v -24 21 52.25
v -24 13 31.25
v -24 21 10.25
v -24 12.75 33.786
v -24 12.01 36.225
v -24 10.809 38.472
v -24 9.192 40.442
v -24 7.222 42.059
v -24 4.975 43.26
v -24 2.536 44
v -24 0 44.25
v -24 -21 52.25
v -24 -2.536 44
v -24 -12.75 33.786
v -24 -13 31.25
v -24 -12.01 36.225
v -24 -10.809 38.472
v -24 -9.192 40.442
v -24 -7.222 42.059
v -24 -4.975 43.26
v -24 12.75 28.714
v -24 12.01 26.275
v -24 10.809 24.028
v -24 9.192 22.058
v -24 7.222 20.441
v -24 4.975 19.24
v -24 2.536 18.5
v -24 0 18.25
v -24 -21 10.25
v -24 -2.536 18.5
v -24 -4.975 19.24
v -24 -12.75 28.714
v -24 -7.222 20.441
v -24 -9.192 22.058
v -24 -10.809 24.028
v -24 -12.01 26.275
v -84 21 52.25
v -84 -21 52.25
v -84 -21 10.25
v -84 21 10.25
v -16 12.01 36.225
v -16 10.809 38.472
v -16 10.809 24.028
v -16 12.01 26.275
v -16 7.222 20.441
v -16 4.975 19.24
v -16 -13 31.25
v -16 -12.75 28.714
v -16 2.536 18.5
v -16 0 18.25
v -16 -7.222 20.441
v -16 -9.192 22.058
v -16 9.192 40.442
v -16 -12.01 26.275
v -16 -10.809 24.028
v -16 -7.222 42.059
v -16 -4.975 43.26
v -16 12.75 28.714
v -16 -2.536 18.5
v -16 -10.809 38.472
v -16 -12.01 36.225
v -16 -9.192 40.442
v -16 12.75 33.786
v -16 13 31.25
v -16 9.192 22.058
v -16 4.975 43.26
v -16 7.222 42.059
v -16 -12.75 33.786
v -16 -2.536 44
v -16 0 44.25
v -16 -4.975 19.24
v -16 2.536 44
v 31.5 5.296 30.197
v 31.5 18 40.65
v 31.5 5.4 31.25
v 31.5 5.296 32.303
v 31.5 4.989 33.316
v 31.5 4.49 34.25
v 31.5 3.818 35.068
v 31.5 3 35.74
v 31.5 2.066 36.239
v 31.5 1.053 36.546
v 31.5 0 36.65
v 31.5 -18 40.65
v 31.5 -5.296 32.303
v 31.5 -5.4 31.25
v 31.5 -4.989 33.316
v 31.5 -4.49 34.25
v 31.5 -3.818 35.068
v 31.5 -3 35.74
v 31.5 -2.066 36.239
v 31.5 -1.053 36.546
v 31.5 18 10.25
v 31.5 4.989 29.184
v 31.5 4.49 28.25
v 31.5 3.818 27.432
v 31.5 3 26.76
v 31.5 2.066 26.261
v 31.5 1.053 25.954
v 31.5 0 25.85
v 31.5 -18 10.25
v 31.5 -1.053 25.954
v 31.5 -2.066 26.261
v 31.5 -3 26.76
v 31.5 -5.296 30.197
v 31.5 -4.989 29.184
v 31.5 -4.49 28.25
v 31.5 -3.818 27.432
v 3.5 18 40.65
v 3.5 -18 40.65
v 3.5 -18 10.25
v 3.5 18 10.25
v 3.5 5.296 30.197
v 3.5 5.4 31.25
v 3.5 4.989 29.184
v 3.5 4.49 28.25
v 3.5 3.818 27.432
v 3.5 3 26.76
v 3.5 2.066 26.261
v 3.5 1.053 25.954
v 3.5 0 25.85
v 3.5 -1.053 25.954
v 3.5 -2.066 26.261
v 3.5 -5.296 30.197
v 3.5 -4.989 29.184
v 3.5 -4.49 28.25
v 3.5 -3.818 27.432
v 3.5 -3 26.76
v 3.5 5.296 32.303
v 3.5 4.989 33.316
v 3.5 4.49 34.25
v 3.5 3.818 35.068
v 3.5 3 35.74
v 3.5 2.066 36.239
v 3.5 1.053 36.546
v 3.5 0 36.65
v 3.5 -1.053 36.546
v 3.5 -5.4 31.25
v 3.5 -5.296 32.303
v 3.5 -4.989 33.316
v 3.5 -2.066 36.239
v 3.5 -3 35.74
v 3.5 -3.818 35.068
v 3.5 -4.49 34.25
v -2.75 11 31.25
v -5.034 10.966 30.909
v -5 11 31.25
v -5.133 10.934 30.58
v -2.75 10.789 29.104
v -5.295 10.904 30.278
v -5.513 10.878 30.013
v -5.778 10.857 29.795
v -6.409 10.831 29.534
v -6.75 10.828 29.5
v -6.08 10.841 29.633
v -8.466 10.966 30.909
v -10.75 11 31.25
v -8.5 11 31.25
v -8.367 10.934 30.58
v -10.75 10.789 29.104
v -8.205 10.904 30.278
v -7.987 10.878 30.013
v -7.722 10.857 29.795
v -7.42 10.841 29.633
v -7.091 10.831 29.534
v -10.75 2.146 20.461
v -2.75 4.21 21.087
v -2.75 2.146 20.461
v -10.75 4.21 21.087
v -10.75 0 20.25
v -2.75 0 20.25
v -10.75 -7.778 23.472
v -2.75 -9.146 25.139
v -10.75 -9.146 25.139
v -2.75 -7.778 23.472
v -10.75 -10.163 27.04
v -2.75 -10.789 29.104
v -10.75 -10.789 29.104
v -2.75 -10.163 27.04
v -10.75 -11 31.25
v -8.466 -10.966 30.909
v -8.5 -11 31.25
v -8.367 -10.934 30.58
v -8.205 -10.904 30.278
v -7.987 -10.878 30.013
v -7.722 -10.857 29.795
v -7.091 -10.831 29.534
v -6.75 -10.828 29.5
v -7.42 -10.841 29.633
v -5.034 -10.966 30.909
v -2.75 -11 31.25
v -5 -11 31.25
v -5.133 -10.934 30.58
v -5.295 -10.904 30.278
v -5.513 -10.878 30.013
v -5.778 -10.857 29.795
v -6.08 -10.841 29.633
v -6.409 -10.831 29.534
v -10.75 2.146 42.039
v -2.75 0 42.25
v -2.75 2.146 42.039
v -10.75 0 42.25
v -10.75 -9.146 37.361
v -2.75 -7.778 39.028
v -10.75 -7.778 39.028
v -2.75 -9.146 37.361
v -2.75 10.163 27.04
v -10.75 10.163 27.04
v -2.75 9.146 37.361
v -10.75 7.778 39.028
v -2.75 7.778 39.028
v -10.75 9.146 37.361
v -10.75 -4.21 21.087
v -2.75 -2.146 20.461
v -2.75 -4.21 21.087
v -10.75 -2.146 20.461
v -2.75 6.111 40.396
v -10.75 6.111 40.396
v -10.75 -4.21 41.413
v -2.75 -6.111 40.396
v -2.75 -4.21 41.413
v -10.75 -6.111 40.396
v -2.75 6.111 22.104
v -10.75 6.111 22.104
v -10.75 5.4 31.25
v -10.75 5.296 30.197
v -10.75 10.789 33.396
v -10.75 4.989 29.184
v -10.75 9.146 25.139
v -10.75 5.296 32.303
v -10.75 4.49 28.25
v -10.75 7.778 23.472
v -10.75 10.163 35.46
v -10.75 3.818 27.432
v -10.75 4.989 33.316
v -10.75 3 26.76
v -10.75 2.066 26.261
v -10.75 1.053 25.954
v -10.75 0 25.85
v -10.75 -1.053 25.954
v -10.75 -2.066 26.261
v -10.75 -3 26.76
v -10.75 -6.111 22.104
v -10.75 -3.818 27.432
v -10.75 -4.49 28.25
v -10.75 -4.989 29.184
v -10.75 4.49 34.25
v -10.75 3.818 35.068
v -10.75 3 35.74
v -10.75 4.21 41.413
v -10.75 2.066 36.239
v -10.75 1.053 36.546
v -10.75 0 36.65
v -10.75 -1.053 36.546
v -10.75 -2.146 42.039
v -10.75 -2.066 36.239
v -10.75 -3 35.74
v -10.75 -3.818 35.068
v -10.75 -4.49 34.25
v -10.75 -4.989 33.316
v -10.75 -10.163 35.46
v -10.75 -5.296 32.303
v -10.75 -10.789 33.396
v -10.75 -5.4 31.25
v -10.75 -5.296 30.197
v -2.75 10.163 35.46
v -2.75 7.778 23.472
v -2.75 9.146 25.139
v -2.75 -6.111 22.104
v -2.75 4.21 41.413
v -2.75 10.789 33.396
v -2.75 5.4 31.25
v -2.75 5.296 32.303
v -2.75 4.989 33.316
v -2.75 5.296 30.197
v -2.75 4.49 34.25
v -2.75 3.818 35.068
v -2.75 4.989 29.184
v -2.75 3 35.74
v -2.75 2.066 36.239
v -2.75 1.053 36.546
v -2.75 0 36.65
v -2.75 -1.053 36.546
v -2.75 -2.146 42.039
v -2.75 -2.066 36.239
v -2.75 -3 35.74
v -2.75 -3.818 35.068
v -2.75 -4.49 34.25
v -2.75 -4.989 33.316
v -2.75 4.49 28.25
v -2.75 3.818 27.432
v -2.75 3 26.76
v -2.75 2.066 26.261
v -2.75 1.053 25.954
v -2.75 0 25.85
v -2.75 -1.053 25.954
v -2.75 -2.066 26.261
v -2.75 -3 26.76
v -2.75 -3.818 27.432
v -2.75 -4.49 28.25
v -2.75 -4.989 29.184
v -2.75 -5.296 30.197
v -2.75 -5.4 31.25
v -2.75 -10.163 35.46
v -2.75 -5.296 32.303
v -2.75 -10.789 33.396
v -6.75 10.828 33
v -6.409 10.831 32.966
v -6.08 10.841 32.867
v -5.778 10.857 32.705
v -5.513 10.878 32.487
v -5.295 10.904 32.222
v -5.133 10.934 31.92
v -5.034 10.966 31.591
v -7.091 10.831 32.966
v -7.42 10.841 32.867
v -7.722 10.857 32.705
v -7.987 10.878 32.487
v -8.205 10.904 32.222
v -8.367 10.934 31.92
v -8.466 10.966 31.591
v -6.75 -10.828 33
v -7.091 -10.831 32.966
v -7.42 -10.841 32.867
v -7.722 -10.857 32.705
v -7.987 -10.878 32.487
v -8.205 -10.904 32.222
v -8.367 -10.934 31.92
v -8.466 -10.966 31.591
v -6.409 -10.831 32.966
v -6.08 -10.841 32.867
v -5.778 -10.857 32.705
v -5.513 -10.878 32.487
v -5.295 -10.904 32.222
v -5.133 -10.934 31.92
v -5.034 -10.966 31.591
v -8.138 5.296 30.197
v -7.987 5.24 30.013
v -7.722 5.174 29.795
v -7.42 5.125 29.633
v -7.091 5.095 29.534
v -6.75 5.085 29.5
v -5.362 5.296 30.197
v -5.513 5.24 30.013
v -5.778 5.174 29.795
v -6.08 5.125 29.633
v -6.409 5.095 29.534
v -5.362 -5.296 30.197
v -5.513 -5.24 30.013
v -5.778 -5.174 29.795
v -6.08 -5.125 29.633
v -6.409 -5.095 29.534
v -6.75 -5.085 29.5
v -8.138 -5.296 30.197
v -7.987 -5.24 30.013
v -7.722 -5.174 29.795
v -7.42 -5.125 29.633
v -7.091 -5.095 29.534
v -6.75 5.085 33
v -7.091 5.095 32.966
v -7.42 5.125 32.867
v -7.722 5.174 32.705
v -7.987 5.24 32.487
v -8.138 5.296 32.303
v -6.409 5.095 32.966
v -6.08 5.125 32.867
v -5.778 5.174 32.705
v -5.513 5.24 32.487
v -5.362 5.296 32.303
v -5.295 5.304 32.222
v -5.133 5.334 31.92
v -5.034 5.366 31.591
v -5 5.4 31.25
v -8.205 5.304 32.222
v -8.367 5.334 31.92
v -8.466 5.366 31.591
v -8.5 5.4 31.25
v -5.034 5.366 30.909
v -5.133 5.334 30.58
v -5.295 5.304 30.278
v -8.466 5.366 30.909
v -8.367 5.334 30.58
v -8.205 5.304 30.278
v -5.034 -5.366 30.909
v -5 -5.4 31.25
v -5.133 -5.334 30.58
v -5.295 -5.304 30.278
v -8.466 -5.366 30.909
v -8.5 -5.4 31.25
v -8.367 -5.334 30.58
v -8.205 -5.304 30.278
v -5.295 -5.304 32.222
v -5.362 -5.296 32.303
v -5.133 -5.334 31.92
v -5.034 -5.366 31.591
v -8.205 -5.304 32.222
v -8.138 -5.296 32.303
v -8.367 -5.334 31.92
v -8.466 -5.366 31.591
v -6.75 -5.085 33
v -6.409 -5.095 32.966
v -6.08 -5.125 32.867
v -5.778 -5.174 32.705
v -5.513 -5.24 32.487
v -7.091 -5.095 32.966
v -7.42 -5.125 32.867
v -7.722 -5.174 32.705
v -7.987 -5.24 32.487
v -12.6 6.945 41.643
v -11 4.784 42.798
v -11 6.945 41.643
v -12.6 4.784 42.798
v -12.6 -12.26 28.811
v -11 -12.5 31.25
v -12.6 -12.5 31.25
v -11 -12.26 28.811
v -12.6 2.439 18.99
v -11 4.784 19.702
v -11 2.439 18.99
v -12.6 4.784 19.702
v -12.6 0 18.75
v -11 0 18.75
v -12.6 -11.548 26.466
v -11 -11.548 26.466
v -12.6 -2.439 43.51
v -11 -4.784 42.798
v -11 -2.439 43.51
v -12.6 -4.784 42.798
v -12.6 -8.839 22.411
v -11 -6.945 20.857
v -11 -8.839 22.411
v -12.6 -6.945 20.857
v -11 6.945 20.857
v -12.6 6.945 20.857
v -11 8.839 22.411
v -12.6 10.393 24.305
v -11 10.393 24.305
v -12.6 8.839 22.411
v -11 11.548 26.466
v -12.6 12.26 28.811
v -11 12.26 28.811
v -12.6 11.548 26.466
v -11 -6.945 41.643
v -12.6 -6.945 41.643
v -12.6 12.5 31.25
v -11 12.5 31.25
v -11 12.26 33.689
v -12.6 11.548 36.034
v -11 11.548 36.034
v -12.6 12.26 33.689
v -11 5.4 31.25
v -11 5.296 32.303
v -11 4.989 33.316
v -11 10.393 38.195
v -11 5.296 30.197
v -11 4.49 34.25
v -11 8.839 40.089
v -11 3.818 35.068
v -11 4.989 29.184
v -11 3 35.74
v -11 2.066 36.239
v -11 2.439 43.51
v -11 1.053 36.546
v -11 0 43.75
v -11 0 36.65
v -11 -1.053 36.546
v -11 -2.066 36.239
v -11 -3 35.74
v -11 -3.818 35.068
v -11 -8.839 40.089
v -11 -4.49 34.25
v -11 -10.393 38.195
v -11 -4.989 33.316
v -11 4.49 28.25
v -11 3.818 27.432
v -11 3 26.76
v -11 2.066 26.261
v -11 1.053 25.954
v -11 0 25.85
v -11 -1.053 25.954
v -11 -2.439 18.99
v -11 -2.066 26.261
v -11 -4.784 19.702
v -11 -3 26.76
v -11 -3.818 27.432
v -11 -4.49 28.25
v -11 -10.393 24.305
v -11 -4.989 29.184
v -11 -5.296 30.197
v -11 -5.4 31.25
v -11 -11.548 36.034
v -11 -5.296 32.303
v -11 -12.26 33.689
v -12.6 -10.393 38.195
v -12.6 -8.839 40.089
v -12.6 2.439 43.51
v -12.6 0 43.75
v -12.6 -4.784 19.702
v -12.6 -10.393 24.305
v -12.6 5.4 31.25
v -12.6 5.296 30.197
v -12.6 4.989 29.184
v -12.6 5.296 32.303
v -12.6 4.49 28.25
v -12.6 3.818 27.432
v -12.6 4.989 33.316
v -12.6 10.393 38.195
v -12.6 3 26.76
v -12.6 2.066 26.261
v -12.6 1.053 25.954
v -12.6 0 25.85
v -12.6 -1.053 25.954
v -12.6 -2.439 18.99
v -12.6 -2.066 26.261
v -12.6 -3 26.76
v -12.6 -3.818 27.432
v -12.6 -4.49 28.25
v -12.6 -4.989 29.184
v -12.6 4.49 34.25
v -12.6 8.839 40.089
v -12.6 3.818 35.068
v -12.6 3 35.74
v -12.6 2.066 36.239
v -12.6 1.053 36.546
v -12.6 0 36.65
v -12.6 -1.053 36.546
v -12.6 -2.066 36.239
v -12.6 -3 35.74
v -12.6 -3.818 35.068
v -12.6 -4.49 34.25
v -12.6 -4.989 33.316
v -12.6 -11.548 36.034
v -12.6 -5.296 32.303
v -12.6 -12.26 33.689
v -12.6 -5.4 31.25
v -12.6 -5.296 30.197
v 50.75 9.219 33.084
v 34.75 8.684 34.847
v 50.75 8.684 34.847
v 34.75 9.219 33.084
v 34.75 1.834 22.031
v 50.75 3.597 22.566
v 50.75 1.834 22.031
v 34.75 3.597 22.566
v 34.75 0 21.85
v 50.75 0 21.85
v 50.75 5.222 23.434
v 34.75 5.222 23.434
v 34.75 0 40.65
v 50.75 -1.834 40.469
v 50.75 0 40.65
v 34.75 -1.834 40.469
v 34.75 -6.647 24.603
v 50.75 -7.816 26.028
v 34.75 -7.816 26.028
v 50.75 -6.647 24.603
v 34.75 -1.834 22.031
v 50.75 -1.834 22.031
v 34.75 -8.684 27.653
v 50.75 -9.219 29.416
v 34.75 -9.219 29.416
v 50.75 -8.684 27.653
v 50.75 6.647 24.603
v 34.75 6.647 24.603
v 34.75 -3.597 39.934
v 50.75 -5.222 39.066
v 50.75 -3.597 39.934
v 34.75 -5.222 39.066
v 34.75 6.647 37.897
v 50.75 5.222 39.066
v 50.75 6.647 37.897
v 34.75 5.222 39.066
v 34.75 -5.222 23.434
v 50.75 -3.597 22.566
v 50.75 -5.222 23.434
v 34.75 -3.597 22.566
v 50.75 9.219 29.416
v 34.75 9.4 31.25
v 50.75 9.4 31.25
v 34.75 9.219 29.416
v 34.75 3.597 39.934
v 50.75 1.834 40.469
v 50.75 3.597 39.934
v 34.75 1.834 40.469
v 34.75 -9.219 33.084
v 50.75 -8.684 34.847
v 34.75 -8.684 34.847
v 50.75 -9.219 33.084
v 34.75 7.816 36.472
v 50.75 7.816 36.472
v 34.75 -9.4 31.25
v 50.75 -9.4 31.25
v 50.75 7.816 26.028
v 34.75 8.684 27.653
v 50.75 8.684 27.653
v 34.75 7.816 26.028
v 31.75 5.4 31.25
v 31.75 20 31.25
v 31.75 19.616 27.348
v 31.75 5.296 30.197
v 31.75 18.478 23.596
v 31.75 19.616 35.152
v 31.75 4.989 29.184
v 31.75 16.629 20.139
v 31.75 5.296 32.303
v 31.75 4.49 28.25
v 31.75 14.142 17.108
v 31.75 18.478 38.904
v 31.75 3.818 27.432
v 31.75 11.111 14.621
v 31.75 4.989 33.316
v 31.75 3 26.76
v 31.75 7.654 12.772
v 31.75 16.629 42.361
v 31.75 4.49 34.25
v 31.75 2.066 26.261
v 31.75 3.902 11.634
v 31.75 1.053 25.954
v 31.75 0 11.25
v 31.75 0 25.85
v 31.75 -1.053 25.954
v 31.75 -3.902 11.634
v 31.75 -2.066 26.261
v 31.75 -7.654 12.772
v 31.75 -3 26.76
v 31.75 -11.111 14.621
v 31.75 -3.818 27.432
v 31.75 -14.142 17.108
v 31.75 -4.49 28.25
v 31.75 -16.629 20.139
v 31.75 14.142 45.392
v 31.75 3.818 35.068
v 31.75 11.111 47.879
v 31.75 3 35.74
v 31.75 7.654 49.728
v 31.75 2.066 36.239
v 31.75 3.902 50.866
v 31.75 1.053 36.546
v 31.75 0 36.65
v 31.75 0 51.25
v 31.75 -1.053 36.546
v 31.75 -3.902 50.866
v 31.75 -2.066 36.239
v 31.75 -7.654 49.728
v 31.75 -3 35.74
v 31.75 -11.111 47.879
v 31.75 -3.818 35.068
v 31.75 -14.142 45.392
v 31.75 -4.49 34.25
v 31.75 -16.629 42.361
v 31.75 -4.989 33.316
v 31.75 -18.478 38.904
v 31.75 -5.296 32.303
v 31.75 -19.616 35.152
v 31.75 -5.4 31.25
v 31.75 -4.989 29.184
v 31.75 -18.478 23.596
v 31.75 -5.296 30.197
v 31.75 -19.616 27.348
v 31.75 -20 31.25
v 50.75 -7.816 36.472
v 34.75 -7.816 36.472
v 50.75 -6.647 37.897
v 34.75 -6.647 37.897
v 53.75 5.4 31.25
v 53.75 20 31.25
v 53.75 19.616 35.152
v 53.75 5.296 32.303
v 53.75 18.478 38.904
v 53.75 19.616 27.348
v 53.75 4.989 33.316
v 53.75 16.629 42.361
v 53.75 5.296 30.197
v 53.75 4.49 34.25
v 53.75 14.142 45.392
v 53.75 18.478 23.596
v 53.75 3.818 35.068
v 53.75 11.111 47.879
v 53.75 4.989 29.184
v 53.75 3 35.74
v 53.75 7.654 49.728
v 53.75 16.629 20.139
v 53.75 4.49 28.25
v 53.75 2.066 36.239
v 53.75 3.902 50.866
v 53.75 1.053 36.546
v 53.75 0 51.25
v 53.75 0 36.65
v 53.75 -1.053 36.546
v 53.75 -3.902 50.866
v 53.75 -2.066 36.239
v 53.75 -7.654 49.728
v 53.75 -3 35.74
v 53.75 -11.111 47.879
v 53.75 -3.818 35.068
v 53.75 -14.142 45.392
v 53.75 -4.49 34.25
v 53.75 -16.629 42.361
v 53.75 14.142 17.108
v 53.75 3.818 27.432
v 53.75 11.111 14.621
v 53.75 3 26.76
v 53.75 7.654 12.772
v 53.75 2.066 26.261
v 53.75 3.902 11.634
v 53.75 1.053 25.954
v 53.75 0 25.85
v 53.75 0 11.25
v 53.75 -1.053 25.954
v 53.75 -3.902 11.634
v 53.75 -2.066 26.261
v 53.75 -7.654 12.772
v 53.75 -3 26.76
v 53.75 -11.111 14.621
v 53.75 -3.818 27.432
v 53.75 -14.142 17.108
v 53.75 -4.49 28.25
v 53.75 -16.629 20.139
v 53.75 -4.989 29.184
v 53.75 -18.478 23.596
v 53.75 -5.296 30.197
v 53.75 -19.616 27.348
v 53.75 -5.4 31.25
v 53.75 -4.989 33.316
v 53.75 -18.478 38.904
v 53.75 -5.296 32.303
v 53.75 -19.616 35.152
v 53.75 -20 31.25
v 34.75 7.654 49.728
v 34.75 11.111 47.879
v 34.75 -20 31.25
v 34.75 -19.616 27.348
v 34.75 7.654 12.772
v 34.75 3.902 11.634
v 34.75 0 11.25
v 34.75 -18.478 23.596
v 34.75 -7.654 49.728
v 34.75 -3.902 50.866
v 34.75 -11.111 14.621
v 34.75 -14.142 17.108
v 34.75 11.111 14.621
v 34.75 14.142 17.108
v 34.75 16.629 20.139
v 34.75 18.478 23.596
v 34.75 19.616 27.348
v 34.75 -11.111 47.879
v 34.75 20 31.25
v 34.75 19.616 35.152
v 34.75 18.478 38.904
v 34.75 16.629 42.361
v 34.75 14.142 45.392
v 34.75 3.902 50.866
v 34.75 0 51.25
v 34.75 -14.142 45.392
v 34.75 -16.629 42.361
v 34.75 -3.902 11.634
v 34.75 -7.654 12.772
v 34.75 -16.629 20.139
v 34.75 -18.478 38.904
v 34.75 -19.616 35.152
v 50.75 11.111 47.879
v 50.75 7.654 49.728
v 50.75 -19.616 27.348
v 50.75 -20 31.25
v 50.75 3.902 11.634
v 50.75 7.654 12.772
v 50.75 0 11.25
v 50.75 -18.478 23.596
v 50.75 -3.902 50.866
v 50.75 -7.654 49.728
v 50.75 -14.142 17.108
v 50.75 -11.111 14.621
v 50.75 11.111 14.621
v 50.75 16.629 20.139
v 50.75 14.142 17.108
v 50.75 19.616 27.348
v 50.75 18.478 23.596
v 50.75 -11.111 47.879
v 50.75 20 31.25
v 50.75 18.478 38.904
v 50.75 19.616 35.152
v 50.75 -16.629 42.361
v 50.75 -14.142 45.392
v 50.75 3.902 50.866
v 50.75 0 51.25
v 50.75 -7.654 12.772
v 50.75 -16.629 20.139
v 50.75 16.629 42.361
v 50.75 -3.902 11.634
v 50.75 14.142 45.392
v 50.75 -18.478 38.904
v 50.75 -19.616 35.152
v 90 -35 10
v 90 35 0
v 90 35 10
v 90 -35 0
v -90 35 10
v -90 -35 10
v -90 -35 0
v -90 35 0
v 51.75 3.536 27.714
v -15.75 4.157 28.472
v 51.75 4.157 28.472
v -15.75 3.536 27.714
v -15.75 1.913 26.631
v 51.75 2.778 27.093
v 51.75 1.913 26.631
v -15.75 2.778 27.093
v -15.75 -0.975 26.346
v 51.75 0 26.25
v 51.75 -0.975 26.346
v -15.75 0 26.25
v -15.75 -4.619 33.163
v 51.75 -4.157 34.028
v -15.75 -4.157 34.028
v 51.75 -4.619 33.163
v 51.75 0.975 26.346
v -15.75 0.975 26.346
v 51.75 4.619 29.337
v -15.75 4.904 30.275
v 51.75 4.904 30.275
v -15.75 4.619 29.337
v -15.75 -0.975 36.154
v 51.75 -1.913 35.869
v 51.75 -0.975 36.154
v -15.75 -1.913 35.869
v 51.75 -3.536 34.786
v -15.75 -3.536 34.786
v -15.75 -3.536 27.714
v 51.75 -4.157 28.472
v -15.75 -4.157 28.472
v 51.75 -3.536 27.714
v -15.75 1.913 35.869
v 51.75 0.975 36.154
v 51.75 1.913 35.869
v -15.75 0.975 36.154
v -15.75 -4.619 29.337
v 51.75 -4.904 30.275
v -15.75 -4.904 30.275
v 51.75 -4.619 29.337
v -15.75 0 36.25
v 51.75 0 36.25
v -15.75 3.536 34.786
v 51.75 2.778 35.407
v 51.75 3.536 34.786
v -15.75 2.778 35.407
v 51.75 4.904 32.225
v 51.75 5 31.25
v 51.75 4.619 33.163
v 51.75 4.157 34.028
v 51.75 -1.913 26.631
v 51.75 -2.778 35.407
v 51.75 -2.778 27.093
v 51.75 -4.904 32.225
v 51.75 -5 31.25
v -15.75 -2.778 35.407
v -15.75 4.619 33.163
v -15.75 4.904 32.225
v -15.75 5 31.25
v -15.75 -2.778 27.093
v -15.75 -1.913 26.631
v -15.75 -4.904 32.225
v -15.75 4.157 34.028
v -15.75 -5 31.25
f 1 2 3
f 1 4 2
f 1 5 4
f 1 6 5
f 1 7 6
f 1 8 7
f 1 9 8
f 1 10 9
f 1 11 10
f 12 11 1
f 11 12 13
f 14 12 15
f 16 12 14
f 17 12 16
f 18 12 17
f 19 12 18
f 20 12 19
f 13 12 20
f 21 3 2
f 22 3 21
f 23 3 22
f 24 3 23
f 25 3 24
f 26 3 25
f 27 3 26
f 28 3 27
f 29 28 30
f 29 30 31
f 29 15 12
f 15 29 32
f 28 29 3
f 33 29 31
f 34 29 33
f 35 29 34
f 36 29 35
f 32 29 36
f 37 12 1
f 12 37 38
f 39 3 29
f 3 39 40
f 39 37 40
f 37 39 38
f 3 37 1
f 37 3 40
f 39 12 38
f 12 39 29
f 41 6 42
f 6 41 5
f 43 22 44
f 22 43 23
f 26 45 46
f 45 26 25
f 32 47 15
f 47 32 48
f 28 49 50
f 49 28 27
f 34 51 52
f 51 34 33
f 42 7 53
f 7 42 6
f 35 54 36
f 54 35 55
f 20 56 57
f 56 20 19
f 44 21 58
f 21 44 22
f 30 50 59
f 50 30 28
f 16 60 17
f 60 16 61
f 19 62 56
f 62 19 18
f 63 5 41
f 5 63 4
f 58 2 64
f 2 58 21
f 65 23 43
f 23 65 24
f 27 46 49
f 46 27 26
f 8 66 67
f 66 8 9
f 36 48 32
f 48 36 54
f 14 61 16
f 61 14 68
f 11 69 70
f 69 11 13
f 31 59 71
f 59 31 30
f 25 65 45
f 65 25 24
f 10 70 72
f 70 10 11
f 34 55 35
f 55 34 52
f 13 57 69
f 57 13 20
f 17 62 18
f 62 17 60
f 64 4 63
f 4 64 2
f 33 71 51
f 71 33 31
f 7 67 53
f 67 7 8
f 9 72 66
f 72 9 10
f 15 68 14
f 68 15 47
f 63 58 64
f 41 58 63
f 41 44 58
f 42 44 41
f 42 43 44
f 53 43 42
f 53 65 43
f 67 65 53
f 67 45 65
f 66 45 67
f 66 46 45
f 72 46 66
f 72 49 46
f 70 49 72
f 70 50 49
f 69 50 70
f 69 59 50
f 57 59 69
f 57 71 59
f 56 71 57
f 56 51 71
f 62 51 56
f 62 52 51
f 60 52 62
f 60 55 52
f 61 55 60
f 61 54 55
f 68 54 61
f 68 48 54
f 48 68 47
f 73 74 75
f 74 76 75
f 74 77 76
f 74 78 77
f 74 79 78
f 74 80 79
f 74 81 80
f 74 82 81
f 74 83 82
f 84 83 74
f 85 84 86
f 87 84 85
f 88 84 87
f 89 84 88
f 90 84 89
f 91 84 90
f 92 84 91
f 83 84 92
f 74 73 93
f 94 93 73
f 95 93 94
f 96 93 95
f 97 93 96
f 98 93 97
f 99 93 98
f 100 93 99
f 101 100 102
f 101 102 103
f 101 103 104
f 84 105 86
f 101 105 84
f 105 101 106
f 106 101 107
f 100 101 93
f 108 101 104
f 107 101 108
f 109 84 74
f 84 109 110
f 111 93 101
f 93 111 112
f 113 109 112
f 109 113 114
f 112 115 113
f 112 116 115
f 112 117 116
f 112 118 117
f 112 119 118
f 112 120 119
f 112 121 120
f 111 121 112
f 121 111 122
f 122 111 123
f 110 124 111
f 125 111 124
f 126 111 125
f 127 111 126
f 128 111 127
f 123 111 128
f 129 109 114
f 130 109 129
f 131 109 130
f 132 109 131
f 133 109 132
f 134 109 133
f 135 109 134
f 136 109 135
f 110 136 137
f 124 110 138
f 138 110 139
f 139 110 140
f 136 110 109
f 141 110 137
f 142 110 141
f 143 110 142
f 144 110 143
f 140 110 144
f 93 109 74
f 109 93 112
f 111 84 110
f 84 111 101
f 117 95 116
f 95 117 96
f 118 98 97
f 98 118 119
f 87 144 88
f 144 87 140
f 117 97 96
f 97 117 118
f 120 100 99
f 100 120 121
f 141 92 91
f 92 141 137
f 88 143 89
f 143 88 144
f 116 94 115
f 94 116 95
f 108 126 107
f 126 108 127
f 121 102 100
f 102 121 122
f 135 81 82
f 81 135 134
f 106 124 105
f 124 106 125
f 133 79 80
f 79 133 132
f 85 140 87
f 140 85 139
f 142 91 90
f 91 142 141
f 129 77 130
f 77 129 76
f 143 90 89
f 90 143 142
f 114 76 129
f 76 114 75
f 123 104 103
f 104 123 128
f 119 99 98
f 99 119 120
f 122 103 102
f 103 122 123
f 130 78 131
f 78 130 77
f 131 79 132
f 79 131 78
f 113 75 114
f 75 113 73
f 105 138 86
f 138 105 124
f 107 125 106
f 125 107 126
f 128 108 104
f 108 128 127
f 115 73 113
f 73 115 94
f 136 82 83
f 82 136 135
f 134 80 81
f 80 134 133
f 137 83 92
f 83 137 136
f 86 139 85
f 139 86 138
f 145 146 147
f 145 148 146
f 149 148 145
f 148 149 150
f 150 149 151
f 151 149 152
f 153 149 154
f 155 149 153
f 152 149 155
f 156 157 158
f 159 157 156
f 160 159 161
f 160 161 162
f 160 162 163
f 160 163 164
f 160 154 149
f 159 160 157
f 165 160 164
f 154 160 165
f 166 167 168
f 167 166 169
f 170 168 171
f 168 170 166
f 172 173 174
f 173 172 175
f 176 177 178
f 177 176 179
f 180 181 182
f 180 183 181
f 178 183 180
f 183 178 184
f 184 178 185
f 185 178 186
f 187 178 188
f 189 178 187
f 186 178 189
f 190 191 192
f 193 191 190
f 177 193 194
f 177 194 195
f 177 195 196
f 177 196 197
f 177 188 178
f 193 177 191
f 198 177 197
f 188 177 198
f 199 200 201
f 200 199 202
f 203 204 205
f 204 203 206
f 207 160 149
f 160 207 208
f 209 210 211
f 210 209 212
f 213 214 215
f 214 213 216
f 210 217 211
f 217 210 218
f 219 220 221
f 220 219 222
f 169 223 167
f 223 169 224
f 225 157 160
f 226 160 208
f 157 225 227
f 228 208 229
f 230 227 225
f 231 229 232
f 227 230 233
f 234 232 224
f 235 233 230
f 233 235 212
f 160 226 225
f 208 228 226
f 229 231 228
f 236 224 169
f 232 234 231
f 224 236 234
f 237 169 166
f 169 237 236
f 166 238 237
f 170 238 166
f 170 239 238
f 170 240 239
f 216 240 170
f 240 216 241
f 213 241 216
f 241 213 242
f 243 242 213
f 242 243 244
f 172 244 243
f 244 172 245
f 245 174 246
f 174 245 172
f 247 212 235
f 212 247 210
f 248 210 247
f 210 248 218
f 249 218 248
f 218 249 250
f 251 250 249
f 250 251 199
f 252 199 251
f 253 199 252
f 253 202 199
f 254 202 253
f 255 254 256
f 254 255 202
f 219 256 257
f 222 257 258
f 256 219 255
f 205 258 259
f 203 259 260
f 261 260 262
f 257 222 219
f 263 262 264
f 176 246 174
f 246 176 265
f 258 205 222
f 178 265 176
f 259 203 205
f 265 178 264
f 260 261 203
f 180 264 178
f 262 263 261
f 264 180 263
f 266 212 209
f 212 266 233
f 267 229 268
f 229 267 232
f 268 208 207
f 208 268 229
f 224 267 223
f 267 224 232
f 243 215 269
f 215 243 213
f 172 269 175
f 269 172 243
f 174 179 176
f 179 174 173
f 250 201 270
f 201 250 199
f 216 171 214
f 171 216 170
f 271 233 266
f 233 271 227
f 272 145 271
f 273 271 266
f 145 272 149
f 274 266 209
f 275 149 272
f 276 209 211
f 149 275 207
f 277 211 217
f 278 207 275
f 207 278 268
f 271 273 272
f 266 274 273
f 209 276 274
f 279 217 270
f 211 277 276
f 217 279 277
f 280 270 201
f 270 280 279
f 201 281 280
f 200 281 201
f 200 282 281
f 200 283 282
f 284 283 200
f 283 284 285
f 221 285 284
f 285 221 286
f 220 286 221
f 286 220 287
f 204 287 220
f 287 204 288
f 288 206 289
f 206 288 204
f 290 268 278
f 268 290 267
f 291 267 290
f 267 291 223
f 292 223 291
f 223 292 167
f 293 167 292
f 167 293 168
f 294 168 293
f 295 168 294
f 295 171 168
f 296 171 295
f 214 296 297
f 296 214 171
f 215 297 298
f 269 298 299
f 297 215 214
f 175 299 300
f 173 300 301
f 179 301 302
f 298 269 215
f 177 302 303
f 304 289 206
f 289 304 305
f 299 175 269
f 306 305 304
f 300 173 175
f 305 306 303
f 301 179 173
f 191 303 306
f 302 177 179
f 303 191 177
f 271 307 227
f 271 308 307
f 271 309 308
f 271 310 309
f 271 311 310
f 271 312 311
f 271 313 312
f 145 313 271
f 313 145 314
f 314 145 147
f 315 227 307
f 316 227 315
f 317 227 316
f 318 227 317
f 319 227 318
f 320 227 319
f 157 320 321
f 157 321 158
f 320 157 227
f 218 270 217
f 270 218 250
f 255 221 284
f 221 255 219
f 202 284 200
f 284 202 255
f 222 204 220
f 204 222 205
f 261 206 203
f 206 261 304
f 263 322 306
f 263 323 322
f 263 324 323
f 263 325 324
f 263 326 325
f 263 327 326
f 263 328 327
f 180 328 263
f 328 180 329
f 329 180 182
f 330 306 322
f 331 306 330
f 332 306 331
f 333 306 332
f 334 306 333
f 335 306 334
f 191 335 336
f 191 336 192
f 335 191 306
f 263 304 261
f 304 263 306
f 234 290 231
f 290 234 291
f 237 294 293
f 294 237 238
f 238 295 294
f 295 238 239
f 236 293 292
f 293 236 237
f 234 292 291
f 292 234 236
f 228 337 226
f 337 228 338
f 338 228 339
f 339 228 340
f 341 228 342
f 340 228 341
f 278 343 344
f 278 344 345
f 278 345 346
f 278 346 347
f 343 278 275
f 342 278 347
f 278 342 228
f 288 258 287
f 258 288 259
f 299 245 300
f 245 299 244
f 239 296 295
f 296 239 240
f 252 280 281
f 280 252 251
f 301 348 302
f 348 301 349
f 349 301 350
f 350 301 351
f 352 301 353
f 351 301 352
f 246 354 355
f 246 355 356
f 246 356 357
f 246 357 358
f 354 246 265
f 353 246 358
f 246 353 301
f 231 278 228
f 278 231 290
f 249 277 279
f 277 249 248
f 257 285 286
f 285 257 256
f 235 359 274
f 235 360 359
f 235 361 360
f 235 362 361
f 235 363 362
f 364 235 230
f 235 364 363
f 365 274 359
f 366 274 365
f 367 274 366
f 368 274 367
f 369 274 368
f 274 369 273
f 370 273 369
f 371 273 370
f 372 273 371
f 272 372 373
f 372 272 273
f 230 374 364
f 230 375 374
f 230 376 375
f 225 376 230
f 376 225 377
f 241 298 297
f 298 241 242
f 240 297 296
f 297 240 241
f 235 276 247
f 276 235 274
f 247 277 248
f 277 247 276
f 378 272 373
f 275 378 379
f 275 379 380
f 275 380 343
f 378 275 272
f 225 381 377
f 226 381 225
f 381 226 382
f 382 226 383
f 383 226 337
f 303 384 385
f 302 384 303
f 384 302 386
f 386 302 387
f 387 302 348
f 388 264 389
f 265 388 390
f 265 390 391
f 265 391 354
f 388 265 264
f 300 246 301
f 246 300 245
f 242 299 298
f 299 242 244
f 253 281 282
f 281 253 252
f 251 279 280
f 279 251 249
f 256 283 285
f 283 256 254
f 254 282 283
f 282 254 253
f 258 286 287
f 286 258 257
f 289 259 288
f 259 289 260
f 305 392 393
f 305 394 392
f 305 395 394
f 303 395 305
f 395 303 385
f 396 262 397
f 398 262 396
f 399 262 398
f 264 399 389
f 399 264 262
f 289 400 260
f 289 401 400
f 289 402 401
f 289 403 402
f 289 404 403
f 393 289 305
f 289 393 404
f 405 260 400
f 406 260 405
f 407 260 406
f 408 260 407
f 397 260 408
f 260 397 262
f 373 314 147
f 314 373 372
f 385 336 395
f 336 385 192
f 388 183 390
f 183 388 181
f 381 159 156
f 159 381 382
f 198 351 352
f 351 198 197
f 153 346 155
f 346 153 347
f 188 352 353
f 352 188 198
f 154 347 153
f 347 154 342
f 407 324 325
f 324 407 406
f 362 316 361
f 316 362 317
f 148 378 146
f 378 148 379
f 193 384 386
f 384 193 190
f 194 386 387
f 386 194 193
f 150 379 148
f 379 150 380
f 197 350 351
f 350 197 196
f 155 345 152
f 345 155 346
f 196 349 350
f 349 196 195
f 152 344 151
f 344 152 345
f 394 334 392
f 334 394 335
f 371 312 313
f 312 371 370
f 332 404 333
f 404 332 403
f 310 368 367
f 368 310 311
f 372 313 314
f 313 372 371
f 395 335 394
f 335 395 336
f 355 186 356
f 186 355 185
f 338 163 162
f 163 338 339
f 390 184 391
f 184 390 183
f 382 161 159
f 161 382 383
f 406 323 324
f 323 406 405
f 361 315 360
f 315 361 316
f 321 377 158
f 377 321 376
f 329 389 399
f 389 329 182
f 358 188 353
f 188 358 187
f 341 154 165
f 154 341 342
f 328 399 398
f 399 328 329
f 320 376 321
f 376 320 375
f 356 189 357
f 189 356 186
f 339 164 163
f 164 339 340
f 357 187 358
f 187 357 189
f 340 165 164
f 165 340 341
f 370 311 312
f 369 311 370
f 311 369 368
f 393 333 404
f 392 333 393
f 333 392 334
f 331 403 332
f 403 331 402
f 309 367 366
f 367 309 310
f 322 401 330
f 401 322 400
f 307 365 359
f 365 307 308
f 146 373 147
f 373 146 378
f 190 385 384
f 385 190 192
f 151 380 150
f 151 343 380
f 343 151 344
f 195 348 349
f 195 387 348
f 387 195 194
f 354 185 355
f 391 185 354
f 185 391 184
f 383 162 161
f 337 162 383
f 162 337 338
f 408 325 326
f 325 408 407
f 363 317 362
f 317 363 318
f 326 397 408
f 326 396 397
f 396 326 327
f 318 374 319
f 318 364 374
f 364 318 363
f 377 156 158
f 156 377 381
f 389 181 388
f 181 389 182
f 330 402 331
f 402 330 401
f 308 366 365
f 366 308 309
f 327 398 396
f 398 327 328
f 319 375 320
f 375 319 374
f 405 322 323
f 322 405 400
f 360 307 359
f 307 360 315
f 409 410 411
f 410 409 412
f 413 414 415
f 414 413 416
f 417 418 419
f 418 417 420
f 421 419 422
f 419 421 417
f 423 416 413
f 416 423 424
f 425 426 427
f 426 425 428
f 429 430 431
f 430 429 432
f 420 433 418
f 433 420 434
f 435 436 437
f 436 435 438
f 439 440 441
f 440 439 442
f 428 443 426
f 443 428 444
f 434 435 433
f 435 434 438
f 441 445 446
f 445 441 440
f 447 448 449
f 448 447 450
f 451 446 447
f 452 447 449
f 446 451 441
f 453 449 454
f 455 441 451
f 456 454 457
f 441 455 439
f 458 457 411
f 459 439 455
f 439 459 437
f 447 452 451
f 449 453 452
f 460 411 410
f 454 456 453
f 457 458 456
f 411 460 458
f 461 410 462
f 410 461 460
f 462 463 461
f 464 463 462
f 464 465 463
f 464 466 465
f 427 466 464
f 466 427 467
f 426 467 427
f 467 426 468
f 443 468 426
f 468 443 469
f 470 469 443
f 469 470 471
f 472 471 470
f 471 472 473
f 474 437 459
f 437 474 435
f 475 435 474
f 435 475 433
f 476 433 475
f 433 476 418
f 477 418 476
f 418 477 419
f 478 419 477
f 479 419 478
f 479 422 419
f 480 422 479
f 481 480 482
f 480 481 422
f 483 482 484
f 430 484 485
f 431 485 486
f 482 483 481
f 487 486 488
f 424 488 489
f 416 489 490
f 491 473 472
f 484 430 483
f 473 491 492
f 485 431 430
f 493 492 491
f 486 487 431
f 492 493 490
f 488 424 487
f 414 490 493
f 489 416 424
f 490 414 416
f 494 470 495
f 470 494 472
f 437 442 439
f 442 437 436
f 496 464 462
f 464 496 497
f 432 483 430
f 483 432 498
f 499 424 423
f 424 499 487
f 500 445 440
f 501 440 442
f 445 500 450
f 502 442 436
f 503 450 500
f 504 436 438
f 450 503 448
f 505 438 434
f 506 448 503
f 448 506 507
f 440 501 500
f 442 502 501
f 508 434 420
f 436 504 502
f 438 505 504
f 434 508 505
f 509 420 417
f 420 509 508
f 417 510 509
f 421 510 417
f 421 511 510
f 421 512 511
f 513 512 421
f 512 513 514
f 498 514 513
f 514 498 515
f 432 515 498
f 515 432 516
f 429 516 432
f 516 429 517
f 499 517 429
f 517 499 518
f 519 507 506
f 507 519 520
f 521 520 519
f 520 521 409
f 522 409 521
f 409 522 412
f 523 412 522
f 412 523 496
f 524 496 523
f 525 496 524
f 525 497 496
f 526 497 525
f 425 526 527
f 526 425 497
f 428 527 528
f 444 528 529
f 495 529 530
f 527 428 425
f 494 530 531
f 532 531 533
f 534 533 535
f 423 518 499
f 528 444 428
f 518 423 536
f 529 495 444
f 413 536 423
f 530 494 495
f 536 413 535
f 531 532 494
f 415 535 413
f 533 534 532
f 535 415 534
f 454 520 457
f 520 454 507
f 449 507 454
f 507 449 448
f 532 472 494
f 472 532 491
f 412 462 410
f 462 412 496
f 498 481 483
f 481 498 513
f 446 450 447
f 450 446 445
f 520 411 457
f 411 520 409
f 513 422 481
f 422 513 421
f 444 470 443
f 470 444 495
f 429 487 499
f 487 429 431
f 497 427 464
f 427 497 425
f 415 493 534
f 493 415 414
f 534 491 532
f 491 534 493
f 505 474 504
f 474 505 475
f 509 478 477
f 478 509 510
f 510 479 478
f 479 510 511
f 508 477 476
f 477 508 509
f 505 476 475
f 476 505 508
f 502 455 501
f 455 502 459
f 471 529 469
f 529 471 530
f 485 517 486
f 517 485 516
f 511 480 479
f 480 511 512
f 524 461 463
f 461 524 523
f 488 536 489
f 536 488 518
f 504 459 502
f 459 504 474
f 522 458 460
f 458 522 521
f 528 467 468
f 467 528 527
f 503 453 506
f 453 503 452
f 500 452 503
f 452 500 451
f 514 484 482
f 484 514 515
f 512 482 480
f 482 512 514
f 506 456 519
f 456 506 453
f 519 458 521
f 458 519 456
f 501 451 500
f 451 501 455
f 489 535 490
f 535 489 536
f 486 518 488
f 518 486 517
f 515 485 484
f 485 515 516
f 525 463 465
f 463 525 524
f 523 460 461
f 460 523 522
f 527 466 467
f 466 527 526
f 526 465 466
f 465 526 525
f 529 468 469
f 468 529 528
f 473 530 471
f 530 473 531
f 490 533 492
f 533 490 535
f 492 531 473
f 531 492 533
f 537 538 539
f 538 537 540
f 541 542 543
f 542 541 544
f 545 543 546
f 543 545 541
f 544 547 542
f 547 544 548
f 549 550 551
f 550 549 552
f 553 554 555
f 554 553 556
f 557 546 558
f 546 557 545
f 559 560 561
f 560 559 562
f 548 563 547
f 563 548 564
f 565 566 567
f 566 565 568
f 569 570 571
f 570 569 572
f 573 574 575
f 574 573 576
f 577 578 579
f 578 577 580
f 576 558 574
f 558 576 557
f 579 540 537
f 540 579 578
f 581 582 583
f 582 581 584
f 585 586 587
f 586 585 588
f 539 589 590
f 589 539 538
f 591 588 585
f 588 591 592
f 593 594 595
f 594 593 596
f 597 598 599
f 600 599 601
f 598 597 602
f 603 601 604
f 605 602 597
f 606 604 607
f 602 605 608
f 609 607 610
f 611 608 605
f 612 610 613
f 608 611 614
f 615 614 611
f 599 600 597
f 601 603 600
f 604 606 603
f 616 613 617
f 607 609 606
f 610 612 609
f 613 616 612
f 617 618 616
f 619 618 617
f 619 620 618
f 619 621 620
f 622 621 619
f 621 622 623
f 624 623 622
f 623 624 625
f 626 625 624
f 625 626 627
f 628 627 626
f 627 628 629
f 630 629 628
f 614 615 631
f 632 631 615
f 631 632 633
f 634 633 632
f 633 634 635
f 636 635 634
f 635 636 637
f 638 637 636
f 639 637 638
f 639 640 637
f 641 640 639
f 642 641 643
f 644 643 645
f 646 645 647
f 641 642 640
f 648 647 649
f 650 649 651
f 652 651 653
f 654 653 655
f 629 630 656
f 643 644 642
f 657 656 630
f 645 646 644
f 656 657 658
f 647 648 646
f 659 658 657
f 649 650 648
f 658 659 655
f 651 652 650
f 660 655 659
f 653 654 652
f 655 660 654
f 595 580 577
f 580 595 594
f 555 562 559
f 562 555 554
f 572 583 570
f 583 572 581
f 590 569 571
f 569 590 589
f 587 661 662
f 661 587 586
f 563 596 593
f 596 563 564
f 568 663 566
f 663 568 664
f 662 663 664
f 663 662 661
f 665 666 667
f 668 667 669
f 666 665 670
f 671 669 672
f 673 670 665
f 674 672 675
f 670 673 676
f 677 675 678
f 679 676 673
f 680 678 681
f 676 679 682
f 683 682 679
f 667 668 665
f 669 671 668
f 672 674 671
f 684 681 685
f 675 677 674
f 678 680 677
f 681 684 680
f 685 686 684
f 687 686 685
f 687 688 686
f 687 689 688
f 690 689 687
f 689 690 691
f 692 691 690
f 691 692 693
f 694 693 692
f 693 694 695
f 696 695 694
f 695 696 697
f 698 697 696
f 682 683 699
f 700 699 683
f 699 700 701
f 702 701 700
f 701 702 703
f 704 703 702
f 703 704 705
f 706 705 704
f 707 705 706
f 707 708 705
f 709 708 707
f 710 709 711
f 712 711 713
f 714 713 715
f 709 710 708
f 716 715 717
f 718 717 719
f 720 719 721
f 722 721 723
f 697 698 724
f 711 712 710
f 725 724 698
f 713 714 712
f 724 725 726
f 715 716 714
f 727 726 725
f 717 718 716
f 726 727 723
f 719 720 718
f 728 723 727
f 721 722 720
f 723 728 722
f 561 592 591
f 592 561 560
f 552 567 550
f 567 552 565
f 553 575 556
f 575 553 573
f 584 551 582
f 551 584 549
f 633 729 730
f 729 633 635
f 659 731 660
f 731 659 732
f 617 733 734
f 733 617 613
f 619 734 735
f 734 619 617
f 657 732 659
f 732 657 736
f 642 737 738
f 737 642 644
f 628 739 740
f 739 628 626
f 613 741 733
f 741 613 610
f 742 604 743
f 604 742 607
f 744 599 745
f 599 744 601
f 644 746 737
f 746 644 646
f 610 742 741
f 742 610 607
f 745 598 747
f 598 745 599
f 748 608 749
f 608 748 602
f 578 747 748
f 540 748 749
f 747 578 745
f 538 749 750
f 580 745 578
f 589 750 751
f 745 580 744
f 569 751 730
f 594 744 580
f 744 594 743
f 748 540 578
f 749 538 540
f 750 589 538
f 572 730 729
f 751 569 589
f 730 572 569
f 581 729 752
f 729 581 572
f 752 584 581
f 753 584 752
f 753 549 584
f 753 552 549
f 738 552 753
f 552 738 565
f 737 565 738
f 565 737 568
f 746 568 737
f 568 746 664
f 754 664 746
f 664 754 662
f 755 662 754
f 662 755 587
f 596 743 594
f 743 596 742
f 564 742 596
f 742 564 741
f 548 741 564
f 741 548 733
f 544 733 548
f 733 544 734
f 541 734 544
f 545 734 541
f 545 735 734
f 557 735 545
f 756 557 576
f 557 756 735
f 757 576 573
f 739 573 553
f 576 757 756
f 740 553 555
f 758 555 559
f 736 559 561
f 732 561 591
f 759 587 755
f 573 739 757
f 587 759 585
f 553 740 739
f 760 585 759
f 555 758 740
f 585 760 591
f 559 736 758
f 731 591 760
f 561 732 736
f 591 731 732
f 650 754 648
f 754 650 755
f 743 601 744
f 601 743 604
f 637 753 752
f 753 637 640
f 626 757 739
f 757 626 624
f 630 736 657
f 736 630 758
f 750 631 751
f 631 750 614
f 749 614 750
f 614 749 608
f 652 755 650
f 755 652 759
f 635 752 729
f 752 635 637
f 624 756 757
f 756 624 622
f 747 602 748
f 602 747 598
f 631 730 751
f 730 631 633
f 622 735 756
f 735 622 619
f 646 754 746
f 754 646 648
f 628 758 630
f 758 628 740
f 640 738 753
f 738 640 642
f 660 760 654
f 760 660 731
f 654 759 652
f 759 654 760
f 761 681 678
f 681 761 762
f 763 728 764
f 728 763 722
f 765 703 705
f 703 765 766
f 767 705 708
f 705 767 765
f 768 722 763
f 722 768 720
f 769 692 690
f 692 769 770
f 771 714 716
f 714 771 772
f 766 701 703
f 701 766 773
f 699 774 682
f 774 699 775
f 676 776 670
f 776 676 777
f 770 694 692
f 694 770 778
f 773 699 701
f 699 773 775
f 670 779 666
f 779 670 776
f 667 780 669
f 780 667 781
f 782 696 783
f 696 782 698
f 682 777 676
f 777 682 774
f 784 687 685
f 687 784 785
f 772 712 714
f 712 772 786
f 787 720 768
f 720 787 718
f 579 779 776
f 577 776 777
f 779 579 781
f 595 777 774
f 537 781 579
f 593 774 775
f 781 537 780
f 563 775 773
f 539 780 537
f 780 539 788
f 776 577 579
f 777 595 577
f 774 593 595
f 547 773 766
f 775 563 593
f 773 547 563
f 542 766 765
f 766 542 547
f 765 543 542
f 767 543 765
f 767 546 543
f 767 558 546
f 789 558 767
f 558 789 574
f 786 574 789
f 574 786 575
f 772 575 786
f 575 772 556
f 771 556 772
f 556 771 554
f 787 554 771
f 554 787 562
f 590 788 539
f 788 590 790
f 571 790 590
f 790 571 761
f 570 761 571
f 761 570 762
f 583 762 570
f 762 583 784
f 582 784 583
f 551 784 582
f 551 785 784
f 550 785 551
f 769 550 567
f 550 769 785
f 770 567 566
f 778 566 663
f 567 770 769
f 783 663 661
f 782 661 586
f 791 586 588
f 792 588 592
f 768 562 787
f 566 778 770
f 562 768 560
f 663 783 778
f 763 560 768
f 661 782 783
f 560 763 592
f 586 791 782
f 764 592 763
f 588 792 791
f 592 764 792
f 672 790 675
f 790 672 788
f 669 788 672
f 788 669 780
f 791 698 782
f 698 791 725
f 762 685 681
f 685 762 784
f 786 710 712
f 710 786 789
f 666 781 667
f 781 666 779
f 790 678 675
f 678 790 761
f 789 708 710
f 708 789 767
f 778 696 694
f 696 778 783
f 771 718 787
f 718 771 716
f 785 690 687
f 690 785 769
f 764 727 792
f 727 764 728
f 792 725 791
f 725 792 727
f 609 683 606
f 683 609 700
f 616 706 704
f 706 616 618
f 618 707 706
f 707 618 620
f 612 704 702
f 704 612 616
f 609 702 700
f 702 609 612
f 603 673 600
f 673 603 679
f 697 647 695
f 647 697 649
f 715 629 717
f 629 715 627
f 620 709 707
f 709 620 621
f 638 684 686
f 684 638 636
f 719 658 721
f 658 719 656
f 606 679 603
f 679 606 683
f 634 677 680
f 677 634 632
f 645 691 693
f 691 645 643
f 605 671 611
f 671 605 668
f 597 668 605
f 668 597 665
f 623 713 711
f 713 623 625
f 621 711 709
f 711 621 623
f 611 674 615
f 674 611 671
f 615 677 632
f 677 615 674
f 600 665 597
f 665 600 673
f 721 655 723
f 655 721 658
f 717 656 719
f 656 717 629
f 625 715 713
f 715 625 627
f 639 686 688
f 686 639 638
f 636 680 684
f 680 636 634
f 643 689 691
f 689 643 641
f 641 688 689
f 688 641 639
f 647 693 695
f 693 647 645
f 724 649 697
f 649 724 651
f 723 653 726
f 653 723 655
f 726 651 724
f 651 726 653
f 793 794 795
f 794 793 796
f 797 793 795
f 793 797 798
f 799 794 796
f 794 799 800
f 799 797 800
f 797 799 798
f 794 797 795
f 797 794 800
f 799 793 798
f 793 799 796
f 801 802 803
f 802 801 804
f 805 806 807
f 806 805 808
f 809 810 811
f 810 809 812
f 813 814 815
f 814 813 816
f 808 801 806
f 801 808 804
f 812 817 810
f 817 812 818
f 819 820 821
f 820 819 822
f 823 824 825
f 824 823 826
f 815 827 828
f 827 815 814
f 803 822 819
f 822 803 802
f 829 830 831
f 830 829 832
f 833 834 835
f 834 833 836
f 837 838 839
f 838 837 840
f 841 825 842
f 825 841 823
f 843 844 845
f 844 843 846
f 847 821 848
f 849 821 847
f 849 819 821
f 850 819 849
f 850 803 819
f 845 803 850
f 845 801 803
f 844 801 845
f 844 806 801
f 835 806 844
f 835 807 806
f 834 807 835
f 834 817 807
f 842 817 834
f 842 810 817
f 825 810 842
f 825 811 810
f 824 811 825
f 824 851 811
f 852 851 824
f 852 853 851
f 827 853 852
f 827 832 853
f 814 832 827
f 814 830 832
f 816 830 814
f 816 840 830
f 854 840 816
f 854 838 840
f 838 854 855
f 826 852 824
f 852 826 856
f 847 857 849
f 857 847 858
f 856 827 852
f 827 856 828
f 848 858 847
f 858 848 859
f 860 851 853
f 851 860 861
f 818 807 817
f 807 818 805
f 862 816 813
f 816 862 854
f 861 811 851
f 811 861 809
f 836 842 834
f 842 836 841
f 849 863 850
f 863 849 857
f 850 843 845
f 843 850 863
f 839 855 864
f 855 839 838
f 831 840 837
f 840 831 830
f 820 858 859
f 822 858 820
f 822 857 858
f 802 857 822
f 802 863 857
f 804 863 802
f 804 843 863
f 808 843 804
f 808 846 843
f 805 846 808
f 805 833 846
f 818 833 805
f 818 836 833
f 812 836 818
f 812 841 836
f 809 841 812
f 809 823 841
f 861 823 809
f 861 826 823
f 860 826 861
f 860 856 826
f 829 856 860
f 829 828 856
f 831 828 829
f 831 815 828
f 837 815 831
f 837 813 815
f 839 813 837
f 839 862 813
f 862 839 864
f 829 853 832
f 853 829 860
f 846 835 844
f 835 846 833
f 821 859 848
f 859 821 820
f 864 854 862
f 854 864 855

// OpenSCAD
$fn = 32;

// ------------------------------------------------------------------------
// Motor drive station: motor 60 x 42 mm, shaft d10, pulley d40
// Every part is its own module, assembly() places every instance.
// ------------------------------------------------------------------------

// --- part 1 ---
module station_bed() {
  difference() {
    translate([-90, -35, 0]) cube([180, 70, 10]);
  }
}

// --- part 2 ---
module drive_motor() {
  union() {
    translate([-30, -21, 0]) cube([60, 42, 42]);
    translate([34, 0, 21]) rotate([0, 90, 0]) cylinder(h = 8, d = 26, center = true);
  }
}

// --- part 3 ---
module pillow_block() {
  difference() {
    translate([-14, -18, 0]) cube([28, 36, 30.4]);
    translate([0, 0, 21]) rotate([0, 90, 0]) cylinder(h = 30, d = 10.8, center = true);
  }
}

// --- part 4 ---
module drive_shaft() {
  translate([0, 0, -33.75]) cylinder(h = 67.5, d = 10);
}

// --- part 5 ---
module shaft_collar() {
  difference() {
    cylinder(h = 8, d = 22);
    translate([0, 0, -1]) cylinder(h = 10, d = 10.8);
    translate([0, 0, 4]) rotate([90, 0, 0]) cylinder(h = 24, d = 3.5, center = true);
  }
}

// --- part 6 ---
module collar_washer() {
  difference() {
      translate([0, 0, 0]) cylinder(h = 1.6, d = 25);
      translate([0, 0, -1]) cylinder(h = 3.6, d = 10.8);
    }
}

// --- part 7 ---
module drive_pulley() {
  difference() {
    union() {
      cylinder(h = 22, d = 18.8);
      cylinder(h = 3, d = 40);
      translate([0, 0, 19]) cylinder(h = 3, d = 40);
    }
    translate([0, 0, -1]) cylinder(h = 24, d = 10.8);
  }
}

// --- assembly ---
module assembly() {
  color([0.80, 0.24, 0.20]) translate([0, 0, 0]) rotate([0, 0, 0]) station_bed();
  color([0.20, 0.45, 0.75]) translate([-54, 0, 10.25]) rotate([0, 0, 0]) drive_motor();
  color([0.25, 0.62, 0.32]) translate([17.5, 0, 10.25]) rotate([0, 0, 0]) pillow_block();
  color([0.92, 0.70, 0.18]) translate([18, 0, 31.25]) rotate([0, 90, 0]) drive_shaft();
  color([0.58, 0.35, 0.70]) translate([-10.75, 0, 31.25]) rotate([0, 90, 0]) shaft_collar();
  color([0.16, 0.66, 0.66]) translate([-12.6, 0, 31.25]) rotate([0, 90, 0]) collar_washer();
  color([0.85, 0.48, 0.18]) translate([31.75, 0, 31.25]) rotate([0, 90, 0]) drive_pulley();
}

assembly();
